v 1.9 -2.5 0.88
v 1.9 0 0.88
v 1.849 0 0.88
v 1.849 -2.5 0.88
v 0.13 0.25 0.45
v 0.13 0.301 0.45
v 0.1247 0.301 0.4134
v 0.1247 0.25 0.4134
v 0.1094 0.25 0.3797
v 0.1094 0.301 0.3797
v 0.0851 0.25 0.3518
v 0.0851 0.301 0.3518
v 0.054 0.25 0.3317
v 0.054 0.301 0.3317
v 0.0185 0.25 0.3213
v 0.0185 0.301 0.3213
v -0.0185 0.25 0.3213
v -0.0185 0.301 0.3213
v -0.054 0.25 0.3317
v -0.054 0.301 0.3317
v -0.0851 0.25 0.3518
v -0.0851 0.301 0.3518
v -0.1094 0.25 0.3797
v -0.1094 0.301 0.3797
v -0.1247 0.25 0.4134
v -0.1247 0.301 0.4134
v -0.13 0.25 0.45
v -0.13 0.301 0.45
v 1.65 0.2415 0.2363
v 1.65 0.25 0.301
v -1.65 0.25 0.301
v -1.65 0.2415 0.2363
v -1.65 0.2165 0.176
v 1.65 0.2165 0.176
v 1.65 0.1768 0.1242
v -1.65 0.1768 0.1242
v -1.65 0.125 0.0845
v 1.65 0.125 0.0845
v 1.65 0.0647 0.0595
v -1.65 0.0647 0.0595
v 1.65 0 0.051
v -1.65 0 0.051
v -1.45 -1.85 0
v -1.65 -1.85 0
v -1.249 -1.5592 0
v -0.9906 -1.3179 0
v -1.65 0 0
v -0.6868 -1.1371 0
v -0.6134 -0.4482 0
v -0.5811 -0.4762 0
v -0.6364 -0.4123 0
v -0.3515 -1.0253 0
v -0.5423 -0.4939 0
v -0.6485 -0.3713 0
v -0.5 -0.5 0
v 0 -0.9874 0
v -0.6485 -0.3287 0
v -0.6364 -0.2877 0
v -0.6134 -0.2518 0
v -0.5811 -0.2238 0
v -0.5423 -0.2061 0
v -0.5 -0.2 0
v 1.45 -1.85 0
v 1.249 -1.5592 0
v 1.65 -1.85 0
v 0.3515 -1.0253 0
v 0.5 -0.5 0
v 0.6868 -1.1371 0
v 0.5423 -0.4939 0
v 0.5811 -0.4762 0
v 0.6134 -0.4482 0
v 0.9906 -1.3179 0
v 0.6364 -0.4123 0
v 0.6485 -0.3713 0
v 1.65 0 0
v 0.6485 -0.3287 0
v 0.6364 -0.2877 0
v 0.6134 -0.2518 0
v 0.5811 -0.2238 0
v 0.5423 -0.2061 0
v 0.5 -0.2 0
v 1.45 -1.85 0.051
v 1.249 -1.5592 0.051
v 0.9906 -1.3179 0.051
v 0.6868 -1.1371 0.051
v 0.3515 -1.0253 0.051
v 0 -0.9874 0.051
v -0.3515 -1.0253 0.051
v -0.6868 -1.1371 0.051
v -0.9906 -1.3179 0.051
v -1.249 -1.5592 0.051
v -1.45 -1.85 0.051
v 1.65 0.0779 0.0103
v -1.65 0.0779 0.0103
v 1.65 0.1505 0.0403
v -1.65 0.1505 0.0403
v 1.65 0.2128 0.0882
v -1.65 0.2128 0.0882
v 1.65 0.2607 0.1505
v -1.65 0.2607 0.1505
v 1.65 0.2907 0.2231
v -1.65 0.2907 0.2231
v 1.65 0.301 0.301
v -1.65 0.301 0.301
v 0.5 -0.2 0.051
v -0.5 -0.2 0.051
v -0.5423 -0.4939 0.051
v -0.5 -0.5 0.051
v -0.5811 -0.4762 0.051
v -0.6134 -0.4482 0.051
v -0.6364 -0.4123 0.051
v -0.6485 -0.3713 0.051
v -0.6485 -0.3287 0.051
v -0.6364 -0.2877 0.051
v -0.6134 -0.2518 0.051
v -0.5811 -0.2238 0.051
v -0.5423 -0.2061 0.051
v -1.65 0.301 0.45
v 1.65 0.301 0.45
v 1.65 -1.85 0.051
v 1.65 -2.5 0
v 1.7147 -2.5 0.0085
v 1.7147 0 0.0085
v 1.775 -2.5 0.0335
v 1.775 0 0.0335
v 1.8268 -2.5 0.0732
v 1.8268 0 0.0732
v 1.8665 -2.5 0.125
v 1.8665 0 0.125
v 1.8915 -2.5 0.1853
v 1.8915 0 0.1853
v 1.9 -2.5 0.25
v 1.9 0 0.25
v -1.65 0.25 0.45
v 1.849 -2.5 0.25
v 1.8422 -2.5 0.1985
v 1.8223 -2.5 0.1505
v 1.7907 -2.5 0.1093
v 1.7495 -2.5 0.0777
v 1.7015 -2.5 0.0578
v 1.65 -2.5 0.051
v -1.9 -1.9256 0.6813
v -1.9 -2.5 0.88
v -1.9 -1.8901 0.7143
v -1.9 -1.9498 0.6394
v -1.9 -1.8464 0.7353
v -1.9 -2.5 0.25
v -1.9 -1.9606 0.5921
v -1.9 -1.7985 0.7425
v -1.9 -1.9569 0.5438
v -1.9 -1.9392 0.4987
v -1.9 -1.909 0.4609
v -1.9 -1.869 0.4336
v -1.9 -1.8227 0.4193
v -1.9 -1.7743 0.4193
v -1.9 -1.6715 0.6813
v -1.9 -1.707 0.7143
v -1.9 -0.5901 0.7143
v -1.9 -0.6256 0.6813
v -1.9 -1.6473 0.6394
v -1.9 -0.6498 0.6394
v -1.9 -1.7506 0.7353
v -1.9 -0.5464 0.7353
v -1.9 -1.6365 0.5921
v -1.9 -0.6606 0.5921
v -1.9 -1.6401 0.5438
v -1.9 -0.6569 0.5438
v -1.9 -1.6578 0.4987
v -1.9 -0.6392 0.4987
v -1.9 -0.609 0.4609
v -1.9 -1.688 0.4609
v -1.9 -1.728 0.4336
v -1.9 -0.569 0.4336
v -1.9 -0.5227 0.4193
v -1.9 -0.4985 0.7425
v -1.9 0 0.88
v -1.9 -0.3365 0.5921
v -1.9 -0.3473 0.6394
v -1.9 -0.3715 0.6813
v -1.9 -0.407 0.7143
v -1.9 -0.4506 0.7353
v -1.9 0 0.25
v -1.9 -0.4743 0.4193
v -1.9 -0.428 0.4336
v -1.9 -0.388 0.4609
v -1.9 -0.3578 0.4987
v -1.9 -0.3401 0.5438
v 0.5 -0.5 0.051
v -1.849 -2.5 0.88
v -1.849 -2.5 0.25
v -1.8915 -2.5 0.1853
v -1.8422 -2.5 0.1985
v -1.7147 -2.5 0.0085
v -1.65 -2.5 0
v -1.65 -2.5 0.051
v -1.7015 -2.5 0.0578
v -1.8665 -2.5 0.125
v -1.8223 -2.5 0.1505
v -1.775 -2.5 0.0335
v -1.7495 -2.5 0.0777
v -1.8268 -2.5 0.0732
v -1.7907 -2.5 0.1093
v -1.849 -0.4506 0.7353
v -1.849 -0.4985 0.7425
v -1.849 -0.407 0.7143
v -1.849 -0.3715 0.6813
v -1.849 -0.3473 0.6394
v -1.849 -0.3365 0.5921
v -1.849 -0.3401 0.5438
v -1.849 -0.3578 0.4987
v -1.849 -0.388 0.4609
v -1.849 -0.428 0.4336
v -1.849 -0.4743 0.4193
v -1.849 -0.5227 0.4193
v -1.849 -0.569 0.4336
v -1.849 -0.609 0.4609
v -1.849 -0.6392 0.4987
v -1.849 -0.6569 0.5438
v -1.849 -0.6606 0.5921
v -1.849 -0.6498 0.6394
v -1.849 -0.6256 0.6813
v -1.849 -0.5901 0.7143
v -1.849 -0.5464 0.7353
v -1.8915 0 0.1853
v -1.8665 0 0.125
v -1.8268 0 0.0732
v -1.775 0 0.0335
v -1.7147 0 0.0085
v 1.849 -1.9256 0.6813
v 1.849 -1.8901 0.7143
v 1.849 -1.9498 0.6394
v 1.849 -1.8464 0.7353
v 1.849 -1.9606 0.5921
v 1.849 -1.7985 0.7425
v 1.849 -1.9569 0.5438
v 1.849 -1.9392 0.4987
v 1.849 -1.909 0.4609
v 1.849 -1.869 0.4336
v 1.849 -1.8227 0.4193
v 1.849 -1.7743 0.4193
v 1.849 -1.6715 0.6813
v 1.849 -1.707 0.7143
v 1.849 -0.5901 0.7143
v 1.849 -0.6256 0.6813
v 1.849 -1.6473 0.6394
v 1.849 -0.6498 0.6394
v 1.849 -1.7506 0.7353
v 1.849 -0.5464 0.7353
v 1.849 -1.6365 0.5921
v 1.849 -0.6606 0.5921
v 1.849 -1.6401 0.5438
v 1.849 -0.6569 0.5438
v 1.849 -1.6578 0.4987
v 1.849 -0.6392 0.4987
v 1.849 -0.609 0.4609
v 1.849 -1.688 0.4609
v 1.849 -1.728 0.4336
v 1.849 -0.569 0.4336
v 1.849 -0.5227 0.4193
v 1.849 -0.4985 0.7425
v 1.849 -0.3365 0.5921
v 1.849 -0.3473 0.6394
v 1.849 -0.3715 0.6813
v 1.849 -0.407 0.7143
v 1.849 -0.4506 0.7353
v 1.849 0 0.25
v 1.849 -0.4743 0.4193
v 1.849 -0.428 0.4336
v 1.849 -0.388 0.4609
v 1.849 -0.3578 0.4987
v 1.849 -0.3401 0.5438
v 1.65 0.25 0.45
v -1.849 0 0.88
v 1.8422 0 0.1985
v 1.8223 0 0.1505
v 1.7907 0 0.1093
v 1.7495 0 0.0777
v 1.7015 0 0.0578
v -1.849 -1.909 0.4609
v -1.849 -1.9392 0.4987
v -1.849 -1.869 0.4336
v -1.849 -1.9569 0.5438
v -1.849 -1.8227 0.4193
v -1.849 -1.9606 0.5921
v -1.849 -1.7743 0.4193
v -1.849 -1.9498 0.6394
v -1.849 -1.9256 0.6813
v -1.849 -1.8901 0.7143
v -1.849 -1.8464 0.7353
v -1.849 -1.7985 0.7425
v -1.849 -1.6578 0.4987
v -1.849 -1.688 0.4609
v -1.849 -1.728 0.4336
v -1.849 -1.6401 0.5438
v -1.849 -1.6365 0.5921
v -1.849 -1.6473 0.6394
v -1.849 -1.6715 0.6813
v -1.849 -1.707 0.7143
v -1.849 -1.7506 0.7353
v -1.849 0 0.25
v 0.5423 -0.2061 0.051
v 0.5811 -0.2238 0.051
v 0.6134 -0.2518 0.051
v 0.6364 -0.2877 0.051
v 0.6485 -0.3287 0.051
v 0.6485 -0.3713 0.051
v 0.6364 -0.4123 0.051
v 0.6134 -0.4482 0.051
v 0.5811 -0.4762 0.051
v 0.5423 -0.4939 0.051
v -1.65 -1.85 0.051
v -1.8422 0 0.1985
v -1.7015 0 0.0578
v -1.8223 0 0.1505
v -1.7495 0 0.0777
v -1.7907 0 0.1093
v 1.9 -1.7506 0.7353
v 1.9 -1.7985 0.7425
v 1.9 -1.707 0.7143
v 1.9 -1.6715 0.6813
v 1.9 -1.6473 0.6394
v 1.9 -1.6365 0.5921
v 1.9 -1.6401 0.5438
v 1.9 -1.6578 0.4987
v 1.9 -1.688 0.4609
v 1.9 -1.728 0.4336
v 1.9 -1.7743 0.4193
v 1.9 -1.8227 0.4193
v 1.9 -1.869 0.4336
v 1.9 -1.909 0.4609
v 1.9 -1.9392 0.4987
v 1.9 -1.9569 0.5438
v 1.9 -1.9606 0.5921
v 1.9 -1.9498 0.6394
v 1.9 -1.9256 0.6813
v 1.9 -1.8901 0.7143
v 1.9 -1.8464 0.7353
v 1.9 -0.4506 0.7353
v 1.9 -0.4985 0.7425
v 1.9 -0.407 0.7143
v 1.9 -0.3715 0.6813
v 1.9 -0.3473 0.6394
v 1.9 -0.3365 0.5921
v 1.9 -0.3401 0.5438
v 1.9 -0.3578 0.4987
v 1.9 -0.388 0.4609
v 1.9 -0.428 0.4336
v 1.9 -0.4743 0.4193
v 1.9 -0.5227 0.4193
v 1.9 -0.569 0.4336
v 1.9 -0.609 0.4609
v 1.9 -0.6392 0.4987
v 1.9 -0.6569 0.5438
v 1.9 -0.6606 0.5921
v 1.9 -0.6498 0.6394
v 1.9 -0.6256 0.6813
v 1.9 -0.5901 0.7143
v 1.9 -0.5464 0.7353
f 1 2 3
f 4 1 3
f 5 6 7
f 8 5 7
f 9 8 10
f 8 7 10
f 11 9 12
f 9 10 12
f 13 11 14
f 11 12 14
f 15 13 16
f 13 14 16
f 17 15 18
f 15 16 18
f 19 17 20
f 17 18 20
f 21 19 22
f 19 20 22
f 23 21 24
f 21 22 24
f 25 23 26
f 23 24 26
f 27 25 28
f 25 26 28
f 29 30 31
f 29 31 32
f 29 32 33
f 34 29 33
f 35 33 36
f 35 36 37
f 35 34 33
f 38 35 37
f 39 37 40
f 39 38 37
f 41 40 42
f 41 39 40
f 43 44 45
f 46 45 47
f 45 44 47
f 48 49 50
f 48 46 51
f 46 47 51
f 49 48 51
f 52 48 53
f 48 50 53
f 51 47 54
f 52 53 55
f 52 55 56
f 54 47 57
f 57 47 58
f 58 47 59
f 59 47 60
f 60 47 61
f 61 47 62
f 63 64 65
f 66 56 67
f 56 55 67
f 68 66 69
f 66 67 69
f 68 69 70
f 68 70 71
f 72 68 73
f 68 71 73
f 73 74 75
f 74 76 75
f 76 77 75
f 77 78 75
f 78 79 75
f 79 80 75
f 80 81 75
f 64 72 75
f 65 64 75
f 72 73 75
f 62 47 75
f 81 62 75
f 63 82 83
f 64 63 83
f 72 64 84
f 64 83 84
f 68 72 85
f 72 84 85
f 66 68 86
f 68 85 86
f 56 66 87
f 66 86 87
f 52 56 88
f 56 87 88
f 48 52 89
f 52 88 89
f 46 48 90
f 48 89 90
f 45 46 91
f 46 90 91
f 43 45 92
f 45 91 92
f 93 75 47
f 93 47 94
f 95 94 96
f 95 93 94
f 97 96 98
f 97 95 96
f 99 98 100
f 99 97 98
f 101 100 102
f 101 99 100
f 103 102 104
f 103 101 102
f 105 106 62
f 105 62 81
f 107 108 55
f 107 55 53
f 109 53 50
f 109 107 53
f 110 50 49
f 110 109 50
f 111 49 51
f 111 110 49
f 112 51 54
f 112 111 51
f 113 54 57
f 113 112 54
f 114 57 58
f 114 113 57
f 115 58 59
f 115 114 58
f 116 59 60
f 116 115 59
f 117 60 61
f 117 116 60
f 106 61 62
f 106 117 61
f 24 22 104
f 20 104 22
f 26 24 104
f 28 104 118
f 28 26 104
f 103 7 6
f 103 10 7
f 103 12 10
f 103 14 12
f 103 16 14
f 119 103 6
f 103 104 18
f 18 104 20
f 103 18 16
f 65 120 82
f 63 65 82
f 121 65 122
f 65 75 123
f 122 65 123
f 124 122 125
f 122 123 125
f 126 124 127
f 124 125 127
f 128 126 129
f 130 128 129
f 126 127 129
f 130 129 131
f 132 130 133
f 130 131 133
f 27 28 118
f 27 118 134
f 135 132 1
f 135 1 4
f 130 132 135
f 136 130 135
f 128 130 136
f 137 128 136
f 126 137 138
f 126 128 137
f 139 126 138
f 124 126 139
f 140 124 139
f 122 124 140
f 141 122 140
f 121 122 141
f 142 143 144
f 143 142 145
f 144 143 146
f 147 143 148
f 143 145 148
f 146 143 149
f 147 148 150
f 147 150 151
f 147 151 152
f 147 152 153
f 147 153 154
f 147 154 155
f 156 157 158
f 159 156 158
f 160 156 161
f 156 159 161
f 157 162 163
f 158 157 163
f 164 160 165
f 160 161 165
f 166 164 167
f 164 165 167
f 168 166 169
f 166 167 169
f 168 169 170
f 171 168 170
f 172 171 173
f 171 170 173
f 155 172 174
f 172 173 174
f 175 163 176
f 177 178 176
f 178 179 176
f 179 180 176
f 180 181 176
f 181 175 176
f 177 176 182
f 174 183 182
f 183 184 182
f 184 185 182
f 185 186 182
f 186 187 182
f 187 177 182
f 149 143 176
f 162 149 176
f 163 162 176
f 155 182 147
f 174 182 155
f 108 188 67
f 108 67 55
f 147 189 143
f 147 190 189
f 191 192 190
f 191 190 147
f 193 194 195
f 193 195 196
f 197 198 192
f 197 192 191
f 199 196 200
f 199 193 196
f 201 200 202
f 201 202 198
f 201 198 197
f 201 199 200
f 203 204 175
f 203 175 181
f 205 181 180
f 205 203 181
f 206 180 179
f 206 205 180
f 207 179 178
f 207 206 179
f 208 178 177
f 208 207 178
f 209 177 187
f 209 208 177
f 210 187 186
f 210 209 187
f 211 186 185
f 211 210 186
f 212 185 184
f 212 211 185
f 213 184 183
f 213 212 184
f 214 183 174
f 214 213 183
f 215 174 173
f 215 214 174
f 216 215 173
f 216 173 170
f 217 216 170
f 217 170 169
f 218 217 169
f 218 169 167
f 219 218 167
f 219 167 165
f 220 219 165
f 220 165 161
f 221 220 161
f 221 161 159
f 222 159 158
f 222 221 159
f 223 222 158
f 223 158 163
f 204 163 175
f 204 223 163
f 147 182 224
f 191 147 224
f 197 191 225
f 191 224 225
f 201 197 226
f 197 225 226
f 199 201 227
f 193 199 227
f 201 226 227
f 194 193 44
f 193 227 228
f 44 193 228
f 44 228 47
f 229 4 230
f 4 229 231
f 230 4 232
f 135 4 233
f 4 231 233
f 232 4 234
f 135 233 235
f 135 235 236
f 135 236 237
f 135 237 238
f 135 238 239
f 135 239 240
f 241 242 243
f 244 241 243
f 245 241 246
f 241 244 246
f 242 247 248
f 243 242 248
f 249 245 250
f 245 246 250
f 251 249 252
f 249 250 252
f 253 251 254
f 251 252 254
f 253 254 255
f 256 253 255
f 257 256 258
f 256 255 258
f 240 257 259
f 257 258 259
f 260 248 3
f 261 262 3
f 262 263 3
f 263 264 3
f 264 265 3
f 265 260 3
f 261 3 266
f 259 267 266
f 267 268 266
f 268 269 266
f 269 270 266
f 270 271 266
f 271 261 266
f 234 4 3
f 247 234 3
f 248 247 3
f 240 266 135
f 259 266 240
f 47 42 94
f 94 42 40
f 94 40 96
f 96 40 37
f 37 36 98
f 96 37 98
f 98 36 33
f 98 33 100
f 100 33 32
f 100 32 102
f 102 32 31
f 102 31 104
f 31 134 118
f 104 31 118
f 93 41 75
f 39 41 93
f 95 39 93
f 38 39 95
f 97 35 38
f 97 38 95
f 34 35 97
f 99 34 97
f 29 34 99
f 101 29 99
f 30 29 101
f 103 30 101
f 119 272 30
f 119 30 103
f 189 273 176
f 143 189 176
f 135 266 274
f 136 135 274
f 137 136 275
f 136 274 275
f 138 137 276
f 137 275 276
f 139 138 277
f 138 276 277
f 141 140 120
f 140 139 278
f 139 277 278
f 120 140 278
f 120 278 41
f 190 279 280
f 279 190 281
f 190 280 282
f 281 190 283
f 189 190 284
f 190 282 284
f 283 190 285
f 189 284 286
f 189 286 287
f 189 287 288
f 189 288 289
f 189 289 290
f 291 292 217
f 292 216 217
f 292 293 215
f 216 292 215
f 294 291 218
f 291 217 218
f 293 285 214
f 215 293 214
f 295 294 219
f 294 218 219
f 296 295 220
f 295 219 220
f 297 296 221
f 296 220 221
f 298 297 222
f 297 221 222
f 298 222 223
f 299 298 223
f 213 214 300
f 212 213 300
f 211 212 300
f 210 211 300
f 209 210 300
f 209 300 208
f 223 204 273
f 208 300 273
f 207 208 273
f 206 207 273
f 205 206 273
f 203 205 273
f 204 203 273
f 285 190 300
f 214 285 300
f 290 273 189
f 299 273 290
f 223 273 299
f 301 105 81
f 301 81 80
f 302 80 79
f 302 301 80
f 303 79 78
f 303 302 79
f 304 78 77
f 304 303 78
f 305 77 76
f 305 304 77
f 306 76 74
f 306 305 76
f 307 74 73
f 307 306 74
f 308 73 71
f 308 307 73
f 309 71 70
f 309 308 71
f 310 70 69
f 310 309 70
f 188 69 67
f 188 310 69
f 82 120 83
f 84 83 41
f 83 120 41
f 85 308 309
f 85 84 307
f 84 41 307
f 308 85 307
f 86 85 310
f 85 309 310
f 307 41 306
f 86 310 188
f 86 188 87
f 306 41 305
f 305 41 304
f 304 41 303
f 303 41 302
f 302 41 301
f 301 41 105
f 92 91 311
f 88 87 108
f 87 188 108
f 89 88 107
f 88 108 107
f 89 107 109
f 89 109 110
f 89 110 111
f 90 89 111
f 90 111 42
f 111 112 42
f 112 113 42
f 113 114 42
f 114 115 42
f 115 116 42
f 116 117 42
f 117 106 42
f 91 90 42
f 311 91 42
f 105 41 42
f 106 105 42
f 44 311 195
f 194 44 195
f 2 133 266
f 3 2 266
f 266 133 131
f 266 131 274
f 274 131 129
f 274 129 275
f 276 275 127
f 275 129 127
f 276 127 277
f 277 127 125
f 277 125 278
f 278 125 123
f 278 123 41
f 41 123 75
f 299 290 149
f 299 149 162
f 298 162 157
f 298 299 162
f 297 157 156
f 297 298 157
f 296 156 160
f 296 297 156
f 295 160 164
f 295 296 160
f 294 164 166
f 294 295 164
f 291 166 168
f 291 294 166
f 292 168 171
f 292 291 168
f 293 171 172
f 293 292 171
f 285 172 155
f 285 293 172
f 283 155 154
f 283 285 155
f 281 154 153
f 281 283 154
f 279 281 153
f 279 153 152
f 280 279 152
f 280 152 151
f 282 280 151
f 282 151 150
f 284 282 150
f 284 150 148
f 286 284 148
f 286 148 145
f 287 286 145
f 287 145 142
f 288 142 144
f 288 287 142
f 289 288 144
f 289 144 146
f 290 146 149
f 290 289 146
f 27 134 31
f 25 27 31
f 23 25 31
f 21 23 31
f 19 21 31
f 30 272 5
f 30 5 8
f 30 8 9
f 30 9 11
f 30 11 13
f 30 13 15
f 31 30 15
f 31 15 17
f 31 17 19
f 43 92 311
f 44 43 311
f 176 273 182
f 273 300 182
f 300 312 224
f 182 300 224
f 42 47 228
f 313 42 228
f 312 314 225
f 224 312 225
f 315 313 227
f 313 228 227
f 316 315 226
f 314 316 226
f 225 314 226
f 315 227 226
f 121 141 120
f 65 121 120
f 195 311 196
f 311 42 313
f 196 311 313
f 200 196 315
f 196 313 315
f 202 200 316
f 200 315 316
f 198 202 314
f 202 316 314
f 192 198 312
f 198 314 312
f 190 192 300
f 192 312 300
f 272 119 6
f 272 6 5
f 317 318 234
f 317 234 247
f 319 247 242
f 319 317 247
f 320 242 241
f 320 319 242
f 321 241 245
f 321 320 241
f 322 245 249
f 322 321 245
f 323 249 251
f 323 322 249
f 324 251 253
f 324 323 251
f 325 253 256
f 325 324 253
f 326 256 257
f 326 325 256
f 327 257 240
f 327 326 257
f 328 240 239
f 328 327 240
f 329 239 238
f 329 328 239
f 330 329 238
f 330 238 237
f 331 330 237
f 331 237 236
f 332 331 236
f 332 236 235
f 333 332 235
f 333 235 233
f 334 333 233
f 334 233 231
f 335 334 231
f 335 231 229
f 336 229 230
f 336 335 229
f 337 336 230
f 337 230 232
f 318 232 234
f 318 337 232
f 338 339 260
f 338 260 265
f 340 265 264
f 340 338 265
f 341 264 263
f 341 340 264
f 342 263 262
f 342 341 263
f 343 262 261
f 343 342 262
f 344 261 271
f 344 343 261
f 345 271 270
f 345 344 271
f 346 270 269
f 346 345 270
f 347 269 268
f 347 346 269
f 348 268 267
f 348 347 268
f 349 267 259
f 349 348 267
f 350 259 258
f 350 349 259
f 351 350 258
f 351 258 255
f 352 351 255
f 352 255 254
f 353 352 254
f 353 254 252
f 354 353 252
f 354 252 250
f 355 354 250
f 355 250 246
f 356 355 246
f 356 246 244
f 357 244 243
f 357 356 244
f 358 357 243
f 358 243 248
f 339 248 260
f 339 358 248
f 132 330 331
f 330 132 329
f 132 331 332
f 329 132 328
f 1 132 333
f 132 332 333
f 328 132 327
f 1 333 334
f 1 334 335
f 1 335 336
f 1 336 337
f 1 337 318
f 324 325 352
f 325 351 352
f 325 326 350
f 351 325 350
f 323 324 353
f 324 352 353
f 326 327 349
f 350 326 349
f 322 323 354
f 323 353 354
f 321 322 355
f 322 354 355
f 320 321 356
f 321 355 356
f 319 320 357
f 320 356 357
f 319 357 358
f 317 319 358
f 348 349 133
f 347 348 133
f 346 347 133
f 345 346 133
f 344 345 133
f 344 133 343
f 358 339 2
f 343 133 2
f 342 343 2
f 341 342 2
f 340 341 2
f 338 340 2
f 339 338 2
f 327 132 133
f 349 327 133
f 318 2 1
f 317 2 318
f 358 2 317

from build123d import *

# Parameters (mm, degrees)
BASE_FLANGE2_DEPTH      = 2.5
EDGE_FLANGE1_DEPTH      = 3.3
CUT_EXTRUDE4_DEPTH      = 3
CUT_EXTRUDE5_DEPTH      = 5.632968811
CUT_EXTRUDE5_DEPTH_BACK = 5.632968811
SKETCH14_R              = 0.1625
CUT_EXTRUDE8_DEPTH      = 0.051


# Sheet-metal steps are written as plain solids
with BuildPart() as part:
    # Sketch1 → Base-Flange2 (new body)
    with BuildSketch(Plane(origin=(0, 0, 0), x_dir=(1, 0, 0), z_dir=(0, 1, 0))):
        with BuildLine():
            Line((-1.9, -0.88), (-1.9, -0.25))
            ThreePointArc((-1.9, -0.25), (-1.826776695, -0.073223305), (-1.65, 0))
            Line((-1.65, 0), (1.65, 0))
            ThreePointArc((1.65, 0), (1.826776695, -0.073223305), (1.9, -0.25))
            Line((1.9, -0.25), (1.9, -0.88))
            Line((1.9, -0.88), (1.849, -0.88))
            Line((1.849, -0.88), (1.849, -0.25))
            ThreePointArc((1.849, -0.25), (1.790714249, -0.109285751), (1.65, -0.051))
            Line((1.65, -0.051), (-1.65, -0.051))
            ThreePointArc((-1.65, -0.051), (-1.790714249, -0.109285751), (-1.849, -0.25))
            Line((-1.849, -0.25), (-1.849, -0.88))
            Line((-1.849, -0.88), (-1.9, -0.88))
        make_face()
    extrude(amount=-BASE_FLANGE2_DEPTH)

    # Edge-Flange1 section (across the edge) → Edge-Flange1 (add)
    with BuildSketch(Plane(origin=(1.65, 0.25, 0.051), x_dir=(0, -1, 0), z_dir=(-1, 0, 0))):
        with BuildLine():
            Line((-0.051, 0.25), (-0.051, 0.399))
            Line((-0.051, 0.399), (0, 0.399))
            Line((0, 0.399), (0, 0.25))
            ThreePointArc((0, 0.25), (0.073223305, 0.073223305), (0.25, 0))
            Line((0.25, 0), (0.25, -0.051))
            ThreePointArc((0.25, -0.051), (0.037160859, 0.037160859), (-0.051, 0.25))
        make_face()
    extrude(amount=EDGE_FLANGE1_DEPTH)

    # Sketch13 → Cut-Extrude4 (cut)
    with BuildSketch(Plane.XY.offset(0.051)):
        with BuildLine():
            Line((-0.5, -0.2), (0.5, -0.2))
            ThreePointArc((0.5, -0.2), (0.65, -0.35), (0.5, -0.5))
            Line((0.5, -0.5), (-0.5, -0.5))
            ThreePointArc((-0.5, -0.5), (-0.65, -0.35), (-0.5, -0.2))
        make_face()
        with BuildLine():
            Line((1.65, -2.5), (1.65, -1.85))
            Line((1.65, -1.85), (1.45, -1.85))
            ThreePointArc((1.45, -1.85), (0, -0.987400787), (-1.45, -1.85))
            Line((-1.45, -1.85), (-1.65, -1.85))
            Line((-1.65, -1.85), (-1.65, -2.5))
            Line((-1.65, -2.5), (1.65, -2.5))
        make_face()
    extrude(amount=-CUT_EXTRUDE4_DEPTH, mode=Mode.SUBTRACT)

    # Sketch14 → Cut-Extrude5 (cut, two sides: drawn at the far end of the back side and taken through both)
    with BuildSketch(Plane.ZY.offset(1.9).offset(-CUT_EXTRUDE5_DEPTH_BACK)):
        with Locations((0.58, -0.498518338)):
            Circle(SKETCH14_R)
        with Locations((0.58, -1.798518338)):
            Circle(SKETCH14_R)
    extrude(amount=CUT_EXTRUDE5_DEPTH + CUT_EXTRUDE5_DEPTH_BACK, mode=Mode.SUBTRACT)

    # Sketch15 → Cut-Extrude8 (cut)
    with BuildSketch(Plane(origin=(0, 0.301, 0), x_dir=(1, 0, 0), z_dir=(0, 1, 0))):
        with BuildLine():
            Line((-0.13, -0.45), (0.13, -0.45))
            ThreePointArc((0.13, -0.45), (0, -0.32), (-0.13, -0.45))
        make_face()
    extrude(amount=-CUT_EXTRUDE8_DEPTH, mode=Mode.SUBTRACT)


solid = part.part
